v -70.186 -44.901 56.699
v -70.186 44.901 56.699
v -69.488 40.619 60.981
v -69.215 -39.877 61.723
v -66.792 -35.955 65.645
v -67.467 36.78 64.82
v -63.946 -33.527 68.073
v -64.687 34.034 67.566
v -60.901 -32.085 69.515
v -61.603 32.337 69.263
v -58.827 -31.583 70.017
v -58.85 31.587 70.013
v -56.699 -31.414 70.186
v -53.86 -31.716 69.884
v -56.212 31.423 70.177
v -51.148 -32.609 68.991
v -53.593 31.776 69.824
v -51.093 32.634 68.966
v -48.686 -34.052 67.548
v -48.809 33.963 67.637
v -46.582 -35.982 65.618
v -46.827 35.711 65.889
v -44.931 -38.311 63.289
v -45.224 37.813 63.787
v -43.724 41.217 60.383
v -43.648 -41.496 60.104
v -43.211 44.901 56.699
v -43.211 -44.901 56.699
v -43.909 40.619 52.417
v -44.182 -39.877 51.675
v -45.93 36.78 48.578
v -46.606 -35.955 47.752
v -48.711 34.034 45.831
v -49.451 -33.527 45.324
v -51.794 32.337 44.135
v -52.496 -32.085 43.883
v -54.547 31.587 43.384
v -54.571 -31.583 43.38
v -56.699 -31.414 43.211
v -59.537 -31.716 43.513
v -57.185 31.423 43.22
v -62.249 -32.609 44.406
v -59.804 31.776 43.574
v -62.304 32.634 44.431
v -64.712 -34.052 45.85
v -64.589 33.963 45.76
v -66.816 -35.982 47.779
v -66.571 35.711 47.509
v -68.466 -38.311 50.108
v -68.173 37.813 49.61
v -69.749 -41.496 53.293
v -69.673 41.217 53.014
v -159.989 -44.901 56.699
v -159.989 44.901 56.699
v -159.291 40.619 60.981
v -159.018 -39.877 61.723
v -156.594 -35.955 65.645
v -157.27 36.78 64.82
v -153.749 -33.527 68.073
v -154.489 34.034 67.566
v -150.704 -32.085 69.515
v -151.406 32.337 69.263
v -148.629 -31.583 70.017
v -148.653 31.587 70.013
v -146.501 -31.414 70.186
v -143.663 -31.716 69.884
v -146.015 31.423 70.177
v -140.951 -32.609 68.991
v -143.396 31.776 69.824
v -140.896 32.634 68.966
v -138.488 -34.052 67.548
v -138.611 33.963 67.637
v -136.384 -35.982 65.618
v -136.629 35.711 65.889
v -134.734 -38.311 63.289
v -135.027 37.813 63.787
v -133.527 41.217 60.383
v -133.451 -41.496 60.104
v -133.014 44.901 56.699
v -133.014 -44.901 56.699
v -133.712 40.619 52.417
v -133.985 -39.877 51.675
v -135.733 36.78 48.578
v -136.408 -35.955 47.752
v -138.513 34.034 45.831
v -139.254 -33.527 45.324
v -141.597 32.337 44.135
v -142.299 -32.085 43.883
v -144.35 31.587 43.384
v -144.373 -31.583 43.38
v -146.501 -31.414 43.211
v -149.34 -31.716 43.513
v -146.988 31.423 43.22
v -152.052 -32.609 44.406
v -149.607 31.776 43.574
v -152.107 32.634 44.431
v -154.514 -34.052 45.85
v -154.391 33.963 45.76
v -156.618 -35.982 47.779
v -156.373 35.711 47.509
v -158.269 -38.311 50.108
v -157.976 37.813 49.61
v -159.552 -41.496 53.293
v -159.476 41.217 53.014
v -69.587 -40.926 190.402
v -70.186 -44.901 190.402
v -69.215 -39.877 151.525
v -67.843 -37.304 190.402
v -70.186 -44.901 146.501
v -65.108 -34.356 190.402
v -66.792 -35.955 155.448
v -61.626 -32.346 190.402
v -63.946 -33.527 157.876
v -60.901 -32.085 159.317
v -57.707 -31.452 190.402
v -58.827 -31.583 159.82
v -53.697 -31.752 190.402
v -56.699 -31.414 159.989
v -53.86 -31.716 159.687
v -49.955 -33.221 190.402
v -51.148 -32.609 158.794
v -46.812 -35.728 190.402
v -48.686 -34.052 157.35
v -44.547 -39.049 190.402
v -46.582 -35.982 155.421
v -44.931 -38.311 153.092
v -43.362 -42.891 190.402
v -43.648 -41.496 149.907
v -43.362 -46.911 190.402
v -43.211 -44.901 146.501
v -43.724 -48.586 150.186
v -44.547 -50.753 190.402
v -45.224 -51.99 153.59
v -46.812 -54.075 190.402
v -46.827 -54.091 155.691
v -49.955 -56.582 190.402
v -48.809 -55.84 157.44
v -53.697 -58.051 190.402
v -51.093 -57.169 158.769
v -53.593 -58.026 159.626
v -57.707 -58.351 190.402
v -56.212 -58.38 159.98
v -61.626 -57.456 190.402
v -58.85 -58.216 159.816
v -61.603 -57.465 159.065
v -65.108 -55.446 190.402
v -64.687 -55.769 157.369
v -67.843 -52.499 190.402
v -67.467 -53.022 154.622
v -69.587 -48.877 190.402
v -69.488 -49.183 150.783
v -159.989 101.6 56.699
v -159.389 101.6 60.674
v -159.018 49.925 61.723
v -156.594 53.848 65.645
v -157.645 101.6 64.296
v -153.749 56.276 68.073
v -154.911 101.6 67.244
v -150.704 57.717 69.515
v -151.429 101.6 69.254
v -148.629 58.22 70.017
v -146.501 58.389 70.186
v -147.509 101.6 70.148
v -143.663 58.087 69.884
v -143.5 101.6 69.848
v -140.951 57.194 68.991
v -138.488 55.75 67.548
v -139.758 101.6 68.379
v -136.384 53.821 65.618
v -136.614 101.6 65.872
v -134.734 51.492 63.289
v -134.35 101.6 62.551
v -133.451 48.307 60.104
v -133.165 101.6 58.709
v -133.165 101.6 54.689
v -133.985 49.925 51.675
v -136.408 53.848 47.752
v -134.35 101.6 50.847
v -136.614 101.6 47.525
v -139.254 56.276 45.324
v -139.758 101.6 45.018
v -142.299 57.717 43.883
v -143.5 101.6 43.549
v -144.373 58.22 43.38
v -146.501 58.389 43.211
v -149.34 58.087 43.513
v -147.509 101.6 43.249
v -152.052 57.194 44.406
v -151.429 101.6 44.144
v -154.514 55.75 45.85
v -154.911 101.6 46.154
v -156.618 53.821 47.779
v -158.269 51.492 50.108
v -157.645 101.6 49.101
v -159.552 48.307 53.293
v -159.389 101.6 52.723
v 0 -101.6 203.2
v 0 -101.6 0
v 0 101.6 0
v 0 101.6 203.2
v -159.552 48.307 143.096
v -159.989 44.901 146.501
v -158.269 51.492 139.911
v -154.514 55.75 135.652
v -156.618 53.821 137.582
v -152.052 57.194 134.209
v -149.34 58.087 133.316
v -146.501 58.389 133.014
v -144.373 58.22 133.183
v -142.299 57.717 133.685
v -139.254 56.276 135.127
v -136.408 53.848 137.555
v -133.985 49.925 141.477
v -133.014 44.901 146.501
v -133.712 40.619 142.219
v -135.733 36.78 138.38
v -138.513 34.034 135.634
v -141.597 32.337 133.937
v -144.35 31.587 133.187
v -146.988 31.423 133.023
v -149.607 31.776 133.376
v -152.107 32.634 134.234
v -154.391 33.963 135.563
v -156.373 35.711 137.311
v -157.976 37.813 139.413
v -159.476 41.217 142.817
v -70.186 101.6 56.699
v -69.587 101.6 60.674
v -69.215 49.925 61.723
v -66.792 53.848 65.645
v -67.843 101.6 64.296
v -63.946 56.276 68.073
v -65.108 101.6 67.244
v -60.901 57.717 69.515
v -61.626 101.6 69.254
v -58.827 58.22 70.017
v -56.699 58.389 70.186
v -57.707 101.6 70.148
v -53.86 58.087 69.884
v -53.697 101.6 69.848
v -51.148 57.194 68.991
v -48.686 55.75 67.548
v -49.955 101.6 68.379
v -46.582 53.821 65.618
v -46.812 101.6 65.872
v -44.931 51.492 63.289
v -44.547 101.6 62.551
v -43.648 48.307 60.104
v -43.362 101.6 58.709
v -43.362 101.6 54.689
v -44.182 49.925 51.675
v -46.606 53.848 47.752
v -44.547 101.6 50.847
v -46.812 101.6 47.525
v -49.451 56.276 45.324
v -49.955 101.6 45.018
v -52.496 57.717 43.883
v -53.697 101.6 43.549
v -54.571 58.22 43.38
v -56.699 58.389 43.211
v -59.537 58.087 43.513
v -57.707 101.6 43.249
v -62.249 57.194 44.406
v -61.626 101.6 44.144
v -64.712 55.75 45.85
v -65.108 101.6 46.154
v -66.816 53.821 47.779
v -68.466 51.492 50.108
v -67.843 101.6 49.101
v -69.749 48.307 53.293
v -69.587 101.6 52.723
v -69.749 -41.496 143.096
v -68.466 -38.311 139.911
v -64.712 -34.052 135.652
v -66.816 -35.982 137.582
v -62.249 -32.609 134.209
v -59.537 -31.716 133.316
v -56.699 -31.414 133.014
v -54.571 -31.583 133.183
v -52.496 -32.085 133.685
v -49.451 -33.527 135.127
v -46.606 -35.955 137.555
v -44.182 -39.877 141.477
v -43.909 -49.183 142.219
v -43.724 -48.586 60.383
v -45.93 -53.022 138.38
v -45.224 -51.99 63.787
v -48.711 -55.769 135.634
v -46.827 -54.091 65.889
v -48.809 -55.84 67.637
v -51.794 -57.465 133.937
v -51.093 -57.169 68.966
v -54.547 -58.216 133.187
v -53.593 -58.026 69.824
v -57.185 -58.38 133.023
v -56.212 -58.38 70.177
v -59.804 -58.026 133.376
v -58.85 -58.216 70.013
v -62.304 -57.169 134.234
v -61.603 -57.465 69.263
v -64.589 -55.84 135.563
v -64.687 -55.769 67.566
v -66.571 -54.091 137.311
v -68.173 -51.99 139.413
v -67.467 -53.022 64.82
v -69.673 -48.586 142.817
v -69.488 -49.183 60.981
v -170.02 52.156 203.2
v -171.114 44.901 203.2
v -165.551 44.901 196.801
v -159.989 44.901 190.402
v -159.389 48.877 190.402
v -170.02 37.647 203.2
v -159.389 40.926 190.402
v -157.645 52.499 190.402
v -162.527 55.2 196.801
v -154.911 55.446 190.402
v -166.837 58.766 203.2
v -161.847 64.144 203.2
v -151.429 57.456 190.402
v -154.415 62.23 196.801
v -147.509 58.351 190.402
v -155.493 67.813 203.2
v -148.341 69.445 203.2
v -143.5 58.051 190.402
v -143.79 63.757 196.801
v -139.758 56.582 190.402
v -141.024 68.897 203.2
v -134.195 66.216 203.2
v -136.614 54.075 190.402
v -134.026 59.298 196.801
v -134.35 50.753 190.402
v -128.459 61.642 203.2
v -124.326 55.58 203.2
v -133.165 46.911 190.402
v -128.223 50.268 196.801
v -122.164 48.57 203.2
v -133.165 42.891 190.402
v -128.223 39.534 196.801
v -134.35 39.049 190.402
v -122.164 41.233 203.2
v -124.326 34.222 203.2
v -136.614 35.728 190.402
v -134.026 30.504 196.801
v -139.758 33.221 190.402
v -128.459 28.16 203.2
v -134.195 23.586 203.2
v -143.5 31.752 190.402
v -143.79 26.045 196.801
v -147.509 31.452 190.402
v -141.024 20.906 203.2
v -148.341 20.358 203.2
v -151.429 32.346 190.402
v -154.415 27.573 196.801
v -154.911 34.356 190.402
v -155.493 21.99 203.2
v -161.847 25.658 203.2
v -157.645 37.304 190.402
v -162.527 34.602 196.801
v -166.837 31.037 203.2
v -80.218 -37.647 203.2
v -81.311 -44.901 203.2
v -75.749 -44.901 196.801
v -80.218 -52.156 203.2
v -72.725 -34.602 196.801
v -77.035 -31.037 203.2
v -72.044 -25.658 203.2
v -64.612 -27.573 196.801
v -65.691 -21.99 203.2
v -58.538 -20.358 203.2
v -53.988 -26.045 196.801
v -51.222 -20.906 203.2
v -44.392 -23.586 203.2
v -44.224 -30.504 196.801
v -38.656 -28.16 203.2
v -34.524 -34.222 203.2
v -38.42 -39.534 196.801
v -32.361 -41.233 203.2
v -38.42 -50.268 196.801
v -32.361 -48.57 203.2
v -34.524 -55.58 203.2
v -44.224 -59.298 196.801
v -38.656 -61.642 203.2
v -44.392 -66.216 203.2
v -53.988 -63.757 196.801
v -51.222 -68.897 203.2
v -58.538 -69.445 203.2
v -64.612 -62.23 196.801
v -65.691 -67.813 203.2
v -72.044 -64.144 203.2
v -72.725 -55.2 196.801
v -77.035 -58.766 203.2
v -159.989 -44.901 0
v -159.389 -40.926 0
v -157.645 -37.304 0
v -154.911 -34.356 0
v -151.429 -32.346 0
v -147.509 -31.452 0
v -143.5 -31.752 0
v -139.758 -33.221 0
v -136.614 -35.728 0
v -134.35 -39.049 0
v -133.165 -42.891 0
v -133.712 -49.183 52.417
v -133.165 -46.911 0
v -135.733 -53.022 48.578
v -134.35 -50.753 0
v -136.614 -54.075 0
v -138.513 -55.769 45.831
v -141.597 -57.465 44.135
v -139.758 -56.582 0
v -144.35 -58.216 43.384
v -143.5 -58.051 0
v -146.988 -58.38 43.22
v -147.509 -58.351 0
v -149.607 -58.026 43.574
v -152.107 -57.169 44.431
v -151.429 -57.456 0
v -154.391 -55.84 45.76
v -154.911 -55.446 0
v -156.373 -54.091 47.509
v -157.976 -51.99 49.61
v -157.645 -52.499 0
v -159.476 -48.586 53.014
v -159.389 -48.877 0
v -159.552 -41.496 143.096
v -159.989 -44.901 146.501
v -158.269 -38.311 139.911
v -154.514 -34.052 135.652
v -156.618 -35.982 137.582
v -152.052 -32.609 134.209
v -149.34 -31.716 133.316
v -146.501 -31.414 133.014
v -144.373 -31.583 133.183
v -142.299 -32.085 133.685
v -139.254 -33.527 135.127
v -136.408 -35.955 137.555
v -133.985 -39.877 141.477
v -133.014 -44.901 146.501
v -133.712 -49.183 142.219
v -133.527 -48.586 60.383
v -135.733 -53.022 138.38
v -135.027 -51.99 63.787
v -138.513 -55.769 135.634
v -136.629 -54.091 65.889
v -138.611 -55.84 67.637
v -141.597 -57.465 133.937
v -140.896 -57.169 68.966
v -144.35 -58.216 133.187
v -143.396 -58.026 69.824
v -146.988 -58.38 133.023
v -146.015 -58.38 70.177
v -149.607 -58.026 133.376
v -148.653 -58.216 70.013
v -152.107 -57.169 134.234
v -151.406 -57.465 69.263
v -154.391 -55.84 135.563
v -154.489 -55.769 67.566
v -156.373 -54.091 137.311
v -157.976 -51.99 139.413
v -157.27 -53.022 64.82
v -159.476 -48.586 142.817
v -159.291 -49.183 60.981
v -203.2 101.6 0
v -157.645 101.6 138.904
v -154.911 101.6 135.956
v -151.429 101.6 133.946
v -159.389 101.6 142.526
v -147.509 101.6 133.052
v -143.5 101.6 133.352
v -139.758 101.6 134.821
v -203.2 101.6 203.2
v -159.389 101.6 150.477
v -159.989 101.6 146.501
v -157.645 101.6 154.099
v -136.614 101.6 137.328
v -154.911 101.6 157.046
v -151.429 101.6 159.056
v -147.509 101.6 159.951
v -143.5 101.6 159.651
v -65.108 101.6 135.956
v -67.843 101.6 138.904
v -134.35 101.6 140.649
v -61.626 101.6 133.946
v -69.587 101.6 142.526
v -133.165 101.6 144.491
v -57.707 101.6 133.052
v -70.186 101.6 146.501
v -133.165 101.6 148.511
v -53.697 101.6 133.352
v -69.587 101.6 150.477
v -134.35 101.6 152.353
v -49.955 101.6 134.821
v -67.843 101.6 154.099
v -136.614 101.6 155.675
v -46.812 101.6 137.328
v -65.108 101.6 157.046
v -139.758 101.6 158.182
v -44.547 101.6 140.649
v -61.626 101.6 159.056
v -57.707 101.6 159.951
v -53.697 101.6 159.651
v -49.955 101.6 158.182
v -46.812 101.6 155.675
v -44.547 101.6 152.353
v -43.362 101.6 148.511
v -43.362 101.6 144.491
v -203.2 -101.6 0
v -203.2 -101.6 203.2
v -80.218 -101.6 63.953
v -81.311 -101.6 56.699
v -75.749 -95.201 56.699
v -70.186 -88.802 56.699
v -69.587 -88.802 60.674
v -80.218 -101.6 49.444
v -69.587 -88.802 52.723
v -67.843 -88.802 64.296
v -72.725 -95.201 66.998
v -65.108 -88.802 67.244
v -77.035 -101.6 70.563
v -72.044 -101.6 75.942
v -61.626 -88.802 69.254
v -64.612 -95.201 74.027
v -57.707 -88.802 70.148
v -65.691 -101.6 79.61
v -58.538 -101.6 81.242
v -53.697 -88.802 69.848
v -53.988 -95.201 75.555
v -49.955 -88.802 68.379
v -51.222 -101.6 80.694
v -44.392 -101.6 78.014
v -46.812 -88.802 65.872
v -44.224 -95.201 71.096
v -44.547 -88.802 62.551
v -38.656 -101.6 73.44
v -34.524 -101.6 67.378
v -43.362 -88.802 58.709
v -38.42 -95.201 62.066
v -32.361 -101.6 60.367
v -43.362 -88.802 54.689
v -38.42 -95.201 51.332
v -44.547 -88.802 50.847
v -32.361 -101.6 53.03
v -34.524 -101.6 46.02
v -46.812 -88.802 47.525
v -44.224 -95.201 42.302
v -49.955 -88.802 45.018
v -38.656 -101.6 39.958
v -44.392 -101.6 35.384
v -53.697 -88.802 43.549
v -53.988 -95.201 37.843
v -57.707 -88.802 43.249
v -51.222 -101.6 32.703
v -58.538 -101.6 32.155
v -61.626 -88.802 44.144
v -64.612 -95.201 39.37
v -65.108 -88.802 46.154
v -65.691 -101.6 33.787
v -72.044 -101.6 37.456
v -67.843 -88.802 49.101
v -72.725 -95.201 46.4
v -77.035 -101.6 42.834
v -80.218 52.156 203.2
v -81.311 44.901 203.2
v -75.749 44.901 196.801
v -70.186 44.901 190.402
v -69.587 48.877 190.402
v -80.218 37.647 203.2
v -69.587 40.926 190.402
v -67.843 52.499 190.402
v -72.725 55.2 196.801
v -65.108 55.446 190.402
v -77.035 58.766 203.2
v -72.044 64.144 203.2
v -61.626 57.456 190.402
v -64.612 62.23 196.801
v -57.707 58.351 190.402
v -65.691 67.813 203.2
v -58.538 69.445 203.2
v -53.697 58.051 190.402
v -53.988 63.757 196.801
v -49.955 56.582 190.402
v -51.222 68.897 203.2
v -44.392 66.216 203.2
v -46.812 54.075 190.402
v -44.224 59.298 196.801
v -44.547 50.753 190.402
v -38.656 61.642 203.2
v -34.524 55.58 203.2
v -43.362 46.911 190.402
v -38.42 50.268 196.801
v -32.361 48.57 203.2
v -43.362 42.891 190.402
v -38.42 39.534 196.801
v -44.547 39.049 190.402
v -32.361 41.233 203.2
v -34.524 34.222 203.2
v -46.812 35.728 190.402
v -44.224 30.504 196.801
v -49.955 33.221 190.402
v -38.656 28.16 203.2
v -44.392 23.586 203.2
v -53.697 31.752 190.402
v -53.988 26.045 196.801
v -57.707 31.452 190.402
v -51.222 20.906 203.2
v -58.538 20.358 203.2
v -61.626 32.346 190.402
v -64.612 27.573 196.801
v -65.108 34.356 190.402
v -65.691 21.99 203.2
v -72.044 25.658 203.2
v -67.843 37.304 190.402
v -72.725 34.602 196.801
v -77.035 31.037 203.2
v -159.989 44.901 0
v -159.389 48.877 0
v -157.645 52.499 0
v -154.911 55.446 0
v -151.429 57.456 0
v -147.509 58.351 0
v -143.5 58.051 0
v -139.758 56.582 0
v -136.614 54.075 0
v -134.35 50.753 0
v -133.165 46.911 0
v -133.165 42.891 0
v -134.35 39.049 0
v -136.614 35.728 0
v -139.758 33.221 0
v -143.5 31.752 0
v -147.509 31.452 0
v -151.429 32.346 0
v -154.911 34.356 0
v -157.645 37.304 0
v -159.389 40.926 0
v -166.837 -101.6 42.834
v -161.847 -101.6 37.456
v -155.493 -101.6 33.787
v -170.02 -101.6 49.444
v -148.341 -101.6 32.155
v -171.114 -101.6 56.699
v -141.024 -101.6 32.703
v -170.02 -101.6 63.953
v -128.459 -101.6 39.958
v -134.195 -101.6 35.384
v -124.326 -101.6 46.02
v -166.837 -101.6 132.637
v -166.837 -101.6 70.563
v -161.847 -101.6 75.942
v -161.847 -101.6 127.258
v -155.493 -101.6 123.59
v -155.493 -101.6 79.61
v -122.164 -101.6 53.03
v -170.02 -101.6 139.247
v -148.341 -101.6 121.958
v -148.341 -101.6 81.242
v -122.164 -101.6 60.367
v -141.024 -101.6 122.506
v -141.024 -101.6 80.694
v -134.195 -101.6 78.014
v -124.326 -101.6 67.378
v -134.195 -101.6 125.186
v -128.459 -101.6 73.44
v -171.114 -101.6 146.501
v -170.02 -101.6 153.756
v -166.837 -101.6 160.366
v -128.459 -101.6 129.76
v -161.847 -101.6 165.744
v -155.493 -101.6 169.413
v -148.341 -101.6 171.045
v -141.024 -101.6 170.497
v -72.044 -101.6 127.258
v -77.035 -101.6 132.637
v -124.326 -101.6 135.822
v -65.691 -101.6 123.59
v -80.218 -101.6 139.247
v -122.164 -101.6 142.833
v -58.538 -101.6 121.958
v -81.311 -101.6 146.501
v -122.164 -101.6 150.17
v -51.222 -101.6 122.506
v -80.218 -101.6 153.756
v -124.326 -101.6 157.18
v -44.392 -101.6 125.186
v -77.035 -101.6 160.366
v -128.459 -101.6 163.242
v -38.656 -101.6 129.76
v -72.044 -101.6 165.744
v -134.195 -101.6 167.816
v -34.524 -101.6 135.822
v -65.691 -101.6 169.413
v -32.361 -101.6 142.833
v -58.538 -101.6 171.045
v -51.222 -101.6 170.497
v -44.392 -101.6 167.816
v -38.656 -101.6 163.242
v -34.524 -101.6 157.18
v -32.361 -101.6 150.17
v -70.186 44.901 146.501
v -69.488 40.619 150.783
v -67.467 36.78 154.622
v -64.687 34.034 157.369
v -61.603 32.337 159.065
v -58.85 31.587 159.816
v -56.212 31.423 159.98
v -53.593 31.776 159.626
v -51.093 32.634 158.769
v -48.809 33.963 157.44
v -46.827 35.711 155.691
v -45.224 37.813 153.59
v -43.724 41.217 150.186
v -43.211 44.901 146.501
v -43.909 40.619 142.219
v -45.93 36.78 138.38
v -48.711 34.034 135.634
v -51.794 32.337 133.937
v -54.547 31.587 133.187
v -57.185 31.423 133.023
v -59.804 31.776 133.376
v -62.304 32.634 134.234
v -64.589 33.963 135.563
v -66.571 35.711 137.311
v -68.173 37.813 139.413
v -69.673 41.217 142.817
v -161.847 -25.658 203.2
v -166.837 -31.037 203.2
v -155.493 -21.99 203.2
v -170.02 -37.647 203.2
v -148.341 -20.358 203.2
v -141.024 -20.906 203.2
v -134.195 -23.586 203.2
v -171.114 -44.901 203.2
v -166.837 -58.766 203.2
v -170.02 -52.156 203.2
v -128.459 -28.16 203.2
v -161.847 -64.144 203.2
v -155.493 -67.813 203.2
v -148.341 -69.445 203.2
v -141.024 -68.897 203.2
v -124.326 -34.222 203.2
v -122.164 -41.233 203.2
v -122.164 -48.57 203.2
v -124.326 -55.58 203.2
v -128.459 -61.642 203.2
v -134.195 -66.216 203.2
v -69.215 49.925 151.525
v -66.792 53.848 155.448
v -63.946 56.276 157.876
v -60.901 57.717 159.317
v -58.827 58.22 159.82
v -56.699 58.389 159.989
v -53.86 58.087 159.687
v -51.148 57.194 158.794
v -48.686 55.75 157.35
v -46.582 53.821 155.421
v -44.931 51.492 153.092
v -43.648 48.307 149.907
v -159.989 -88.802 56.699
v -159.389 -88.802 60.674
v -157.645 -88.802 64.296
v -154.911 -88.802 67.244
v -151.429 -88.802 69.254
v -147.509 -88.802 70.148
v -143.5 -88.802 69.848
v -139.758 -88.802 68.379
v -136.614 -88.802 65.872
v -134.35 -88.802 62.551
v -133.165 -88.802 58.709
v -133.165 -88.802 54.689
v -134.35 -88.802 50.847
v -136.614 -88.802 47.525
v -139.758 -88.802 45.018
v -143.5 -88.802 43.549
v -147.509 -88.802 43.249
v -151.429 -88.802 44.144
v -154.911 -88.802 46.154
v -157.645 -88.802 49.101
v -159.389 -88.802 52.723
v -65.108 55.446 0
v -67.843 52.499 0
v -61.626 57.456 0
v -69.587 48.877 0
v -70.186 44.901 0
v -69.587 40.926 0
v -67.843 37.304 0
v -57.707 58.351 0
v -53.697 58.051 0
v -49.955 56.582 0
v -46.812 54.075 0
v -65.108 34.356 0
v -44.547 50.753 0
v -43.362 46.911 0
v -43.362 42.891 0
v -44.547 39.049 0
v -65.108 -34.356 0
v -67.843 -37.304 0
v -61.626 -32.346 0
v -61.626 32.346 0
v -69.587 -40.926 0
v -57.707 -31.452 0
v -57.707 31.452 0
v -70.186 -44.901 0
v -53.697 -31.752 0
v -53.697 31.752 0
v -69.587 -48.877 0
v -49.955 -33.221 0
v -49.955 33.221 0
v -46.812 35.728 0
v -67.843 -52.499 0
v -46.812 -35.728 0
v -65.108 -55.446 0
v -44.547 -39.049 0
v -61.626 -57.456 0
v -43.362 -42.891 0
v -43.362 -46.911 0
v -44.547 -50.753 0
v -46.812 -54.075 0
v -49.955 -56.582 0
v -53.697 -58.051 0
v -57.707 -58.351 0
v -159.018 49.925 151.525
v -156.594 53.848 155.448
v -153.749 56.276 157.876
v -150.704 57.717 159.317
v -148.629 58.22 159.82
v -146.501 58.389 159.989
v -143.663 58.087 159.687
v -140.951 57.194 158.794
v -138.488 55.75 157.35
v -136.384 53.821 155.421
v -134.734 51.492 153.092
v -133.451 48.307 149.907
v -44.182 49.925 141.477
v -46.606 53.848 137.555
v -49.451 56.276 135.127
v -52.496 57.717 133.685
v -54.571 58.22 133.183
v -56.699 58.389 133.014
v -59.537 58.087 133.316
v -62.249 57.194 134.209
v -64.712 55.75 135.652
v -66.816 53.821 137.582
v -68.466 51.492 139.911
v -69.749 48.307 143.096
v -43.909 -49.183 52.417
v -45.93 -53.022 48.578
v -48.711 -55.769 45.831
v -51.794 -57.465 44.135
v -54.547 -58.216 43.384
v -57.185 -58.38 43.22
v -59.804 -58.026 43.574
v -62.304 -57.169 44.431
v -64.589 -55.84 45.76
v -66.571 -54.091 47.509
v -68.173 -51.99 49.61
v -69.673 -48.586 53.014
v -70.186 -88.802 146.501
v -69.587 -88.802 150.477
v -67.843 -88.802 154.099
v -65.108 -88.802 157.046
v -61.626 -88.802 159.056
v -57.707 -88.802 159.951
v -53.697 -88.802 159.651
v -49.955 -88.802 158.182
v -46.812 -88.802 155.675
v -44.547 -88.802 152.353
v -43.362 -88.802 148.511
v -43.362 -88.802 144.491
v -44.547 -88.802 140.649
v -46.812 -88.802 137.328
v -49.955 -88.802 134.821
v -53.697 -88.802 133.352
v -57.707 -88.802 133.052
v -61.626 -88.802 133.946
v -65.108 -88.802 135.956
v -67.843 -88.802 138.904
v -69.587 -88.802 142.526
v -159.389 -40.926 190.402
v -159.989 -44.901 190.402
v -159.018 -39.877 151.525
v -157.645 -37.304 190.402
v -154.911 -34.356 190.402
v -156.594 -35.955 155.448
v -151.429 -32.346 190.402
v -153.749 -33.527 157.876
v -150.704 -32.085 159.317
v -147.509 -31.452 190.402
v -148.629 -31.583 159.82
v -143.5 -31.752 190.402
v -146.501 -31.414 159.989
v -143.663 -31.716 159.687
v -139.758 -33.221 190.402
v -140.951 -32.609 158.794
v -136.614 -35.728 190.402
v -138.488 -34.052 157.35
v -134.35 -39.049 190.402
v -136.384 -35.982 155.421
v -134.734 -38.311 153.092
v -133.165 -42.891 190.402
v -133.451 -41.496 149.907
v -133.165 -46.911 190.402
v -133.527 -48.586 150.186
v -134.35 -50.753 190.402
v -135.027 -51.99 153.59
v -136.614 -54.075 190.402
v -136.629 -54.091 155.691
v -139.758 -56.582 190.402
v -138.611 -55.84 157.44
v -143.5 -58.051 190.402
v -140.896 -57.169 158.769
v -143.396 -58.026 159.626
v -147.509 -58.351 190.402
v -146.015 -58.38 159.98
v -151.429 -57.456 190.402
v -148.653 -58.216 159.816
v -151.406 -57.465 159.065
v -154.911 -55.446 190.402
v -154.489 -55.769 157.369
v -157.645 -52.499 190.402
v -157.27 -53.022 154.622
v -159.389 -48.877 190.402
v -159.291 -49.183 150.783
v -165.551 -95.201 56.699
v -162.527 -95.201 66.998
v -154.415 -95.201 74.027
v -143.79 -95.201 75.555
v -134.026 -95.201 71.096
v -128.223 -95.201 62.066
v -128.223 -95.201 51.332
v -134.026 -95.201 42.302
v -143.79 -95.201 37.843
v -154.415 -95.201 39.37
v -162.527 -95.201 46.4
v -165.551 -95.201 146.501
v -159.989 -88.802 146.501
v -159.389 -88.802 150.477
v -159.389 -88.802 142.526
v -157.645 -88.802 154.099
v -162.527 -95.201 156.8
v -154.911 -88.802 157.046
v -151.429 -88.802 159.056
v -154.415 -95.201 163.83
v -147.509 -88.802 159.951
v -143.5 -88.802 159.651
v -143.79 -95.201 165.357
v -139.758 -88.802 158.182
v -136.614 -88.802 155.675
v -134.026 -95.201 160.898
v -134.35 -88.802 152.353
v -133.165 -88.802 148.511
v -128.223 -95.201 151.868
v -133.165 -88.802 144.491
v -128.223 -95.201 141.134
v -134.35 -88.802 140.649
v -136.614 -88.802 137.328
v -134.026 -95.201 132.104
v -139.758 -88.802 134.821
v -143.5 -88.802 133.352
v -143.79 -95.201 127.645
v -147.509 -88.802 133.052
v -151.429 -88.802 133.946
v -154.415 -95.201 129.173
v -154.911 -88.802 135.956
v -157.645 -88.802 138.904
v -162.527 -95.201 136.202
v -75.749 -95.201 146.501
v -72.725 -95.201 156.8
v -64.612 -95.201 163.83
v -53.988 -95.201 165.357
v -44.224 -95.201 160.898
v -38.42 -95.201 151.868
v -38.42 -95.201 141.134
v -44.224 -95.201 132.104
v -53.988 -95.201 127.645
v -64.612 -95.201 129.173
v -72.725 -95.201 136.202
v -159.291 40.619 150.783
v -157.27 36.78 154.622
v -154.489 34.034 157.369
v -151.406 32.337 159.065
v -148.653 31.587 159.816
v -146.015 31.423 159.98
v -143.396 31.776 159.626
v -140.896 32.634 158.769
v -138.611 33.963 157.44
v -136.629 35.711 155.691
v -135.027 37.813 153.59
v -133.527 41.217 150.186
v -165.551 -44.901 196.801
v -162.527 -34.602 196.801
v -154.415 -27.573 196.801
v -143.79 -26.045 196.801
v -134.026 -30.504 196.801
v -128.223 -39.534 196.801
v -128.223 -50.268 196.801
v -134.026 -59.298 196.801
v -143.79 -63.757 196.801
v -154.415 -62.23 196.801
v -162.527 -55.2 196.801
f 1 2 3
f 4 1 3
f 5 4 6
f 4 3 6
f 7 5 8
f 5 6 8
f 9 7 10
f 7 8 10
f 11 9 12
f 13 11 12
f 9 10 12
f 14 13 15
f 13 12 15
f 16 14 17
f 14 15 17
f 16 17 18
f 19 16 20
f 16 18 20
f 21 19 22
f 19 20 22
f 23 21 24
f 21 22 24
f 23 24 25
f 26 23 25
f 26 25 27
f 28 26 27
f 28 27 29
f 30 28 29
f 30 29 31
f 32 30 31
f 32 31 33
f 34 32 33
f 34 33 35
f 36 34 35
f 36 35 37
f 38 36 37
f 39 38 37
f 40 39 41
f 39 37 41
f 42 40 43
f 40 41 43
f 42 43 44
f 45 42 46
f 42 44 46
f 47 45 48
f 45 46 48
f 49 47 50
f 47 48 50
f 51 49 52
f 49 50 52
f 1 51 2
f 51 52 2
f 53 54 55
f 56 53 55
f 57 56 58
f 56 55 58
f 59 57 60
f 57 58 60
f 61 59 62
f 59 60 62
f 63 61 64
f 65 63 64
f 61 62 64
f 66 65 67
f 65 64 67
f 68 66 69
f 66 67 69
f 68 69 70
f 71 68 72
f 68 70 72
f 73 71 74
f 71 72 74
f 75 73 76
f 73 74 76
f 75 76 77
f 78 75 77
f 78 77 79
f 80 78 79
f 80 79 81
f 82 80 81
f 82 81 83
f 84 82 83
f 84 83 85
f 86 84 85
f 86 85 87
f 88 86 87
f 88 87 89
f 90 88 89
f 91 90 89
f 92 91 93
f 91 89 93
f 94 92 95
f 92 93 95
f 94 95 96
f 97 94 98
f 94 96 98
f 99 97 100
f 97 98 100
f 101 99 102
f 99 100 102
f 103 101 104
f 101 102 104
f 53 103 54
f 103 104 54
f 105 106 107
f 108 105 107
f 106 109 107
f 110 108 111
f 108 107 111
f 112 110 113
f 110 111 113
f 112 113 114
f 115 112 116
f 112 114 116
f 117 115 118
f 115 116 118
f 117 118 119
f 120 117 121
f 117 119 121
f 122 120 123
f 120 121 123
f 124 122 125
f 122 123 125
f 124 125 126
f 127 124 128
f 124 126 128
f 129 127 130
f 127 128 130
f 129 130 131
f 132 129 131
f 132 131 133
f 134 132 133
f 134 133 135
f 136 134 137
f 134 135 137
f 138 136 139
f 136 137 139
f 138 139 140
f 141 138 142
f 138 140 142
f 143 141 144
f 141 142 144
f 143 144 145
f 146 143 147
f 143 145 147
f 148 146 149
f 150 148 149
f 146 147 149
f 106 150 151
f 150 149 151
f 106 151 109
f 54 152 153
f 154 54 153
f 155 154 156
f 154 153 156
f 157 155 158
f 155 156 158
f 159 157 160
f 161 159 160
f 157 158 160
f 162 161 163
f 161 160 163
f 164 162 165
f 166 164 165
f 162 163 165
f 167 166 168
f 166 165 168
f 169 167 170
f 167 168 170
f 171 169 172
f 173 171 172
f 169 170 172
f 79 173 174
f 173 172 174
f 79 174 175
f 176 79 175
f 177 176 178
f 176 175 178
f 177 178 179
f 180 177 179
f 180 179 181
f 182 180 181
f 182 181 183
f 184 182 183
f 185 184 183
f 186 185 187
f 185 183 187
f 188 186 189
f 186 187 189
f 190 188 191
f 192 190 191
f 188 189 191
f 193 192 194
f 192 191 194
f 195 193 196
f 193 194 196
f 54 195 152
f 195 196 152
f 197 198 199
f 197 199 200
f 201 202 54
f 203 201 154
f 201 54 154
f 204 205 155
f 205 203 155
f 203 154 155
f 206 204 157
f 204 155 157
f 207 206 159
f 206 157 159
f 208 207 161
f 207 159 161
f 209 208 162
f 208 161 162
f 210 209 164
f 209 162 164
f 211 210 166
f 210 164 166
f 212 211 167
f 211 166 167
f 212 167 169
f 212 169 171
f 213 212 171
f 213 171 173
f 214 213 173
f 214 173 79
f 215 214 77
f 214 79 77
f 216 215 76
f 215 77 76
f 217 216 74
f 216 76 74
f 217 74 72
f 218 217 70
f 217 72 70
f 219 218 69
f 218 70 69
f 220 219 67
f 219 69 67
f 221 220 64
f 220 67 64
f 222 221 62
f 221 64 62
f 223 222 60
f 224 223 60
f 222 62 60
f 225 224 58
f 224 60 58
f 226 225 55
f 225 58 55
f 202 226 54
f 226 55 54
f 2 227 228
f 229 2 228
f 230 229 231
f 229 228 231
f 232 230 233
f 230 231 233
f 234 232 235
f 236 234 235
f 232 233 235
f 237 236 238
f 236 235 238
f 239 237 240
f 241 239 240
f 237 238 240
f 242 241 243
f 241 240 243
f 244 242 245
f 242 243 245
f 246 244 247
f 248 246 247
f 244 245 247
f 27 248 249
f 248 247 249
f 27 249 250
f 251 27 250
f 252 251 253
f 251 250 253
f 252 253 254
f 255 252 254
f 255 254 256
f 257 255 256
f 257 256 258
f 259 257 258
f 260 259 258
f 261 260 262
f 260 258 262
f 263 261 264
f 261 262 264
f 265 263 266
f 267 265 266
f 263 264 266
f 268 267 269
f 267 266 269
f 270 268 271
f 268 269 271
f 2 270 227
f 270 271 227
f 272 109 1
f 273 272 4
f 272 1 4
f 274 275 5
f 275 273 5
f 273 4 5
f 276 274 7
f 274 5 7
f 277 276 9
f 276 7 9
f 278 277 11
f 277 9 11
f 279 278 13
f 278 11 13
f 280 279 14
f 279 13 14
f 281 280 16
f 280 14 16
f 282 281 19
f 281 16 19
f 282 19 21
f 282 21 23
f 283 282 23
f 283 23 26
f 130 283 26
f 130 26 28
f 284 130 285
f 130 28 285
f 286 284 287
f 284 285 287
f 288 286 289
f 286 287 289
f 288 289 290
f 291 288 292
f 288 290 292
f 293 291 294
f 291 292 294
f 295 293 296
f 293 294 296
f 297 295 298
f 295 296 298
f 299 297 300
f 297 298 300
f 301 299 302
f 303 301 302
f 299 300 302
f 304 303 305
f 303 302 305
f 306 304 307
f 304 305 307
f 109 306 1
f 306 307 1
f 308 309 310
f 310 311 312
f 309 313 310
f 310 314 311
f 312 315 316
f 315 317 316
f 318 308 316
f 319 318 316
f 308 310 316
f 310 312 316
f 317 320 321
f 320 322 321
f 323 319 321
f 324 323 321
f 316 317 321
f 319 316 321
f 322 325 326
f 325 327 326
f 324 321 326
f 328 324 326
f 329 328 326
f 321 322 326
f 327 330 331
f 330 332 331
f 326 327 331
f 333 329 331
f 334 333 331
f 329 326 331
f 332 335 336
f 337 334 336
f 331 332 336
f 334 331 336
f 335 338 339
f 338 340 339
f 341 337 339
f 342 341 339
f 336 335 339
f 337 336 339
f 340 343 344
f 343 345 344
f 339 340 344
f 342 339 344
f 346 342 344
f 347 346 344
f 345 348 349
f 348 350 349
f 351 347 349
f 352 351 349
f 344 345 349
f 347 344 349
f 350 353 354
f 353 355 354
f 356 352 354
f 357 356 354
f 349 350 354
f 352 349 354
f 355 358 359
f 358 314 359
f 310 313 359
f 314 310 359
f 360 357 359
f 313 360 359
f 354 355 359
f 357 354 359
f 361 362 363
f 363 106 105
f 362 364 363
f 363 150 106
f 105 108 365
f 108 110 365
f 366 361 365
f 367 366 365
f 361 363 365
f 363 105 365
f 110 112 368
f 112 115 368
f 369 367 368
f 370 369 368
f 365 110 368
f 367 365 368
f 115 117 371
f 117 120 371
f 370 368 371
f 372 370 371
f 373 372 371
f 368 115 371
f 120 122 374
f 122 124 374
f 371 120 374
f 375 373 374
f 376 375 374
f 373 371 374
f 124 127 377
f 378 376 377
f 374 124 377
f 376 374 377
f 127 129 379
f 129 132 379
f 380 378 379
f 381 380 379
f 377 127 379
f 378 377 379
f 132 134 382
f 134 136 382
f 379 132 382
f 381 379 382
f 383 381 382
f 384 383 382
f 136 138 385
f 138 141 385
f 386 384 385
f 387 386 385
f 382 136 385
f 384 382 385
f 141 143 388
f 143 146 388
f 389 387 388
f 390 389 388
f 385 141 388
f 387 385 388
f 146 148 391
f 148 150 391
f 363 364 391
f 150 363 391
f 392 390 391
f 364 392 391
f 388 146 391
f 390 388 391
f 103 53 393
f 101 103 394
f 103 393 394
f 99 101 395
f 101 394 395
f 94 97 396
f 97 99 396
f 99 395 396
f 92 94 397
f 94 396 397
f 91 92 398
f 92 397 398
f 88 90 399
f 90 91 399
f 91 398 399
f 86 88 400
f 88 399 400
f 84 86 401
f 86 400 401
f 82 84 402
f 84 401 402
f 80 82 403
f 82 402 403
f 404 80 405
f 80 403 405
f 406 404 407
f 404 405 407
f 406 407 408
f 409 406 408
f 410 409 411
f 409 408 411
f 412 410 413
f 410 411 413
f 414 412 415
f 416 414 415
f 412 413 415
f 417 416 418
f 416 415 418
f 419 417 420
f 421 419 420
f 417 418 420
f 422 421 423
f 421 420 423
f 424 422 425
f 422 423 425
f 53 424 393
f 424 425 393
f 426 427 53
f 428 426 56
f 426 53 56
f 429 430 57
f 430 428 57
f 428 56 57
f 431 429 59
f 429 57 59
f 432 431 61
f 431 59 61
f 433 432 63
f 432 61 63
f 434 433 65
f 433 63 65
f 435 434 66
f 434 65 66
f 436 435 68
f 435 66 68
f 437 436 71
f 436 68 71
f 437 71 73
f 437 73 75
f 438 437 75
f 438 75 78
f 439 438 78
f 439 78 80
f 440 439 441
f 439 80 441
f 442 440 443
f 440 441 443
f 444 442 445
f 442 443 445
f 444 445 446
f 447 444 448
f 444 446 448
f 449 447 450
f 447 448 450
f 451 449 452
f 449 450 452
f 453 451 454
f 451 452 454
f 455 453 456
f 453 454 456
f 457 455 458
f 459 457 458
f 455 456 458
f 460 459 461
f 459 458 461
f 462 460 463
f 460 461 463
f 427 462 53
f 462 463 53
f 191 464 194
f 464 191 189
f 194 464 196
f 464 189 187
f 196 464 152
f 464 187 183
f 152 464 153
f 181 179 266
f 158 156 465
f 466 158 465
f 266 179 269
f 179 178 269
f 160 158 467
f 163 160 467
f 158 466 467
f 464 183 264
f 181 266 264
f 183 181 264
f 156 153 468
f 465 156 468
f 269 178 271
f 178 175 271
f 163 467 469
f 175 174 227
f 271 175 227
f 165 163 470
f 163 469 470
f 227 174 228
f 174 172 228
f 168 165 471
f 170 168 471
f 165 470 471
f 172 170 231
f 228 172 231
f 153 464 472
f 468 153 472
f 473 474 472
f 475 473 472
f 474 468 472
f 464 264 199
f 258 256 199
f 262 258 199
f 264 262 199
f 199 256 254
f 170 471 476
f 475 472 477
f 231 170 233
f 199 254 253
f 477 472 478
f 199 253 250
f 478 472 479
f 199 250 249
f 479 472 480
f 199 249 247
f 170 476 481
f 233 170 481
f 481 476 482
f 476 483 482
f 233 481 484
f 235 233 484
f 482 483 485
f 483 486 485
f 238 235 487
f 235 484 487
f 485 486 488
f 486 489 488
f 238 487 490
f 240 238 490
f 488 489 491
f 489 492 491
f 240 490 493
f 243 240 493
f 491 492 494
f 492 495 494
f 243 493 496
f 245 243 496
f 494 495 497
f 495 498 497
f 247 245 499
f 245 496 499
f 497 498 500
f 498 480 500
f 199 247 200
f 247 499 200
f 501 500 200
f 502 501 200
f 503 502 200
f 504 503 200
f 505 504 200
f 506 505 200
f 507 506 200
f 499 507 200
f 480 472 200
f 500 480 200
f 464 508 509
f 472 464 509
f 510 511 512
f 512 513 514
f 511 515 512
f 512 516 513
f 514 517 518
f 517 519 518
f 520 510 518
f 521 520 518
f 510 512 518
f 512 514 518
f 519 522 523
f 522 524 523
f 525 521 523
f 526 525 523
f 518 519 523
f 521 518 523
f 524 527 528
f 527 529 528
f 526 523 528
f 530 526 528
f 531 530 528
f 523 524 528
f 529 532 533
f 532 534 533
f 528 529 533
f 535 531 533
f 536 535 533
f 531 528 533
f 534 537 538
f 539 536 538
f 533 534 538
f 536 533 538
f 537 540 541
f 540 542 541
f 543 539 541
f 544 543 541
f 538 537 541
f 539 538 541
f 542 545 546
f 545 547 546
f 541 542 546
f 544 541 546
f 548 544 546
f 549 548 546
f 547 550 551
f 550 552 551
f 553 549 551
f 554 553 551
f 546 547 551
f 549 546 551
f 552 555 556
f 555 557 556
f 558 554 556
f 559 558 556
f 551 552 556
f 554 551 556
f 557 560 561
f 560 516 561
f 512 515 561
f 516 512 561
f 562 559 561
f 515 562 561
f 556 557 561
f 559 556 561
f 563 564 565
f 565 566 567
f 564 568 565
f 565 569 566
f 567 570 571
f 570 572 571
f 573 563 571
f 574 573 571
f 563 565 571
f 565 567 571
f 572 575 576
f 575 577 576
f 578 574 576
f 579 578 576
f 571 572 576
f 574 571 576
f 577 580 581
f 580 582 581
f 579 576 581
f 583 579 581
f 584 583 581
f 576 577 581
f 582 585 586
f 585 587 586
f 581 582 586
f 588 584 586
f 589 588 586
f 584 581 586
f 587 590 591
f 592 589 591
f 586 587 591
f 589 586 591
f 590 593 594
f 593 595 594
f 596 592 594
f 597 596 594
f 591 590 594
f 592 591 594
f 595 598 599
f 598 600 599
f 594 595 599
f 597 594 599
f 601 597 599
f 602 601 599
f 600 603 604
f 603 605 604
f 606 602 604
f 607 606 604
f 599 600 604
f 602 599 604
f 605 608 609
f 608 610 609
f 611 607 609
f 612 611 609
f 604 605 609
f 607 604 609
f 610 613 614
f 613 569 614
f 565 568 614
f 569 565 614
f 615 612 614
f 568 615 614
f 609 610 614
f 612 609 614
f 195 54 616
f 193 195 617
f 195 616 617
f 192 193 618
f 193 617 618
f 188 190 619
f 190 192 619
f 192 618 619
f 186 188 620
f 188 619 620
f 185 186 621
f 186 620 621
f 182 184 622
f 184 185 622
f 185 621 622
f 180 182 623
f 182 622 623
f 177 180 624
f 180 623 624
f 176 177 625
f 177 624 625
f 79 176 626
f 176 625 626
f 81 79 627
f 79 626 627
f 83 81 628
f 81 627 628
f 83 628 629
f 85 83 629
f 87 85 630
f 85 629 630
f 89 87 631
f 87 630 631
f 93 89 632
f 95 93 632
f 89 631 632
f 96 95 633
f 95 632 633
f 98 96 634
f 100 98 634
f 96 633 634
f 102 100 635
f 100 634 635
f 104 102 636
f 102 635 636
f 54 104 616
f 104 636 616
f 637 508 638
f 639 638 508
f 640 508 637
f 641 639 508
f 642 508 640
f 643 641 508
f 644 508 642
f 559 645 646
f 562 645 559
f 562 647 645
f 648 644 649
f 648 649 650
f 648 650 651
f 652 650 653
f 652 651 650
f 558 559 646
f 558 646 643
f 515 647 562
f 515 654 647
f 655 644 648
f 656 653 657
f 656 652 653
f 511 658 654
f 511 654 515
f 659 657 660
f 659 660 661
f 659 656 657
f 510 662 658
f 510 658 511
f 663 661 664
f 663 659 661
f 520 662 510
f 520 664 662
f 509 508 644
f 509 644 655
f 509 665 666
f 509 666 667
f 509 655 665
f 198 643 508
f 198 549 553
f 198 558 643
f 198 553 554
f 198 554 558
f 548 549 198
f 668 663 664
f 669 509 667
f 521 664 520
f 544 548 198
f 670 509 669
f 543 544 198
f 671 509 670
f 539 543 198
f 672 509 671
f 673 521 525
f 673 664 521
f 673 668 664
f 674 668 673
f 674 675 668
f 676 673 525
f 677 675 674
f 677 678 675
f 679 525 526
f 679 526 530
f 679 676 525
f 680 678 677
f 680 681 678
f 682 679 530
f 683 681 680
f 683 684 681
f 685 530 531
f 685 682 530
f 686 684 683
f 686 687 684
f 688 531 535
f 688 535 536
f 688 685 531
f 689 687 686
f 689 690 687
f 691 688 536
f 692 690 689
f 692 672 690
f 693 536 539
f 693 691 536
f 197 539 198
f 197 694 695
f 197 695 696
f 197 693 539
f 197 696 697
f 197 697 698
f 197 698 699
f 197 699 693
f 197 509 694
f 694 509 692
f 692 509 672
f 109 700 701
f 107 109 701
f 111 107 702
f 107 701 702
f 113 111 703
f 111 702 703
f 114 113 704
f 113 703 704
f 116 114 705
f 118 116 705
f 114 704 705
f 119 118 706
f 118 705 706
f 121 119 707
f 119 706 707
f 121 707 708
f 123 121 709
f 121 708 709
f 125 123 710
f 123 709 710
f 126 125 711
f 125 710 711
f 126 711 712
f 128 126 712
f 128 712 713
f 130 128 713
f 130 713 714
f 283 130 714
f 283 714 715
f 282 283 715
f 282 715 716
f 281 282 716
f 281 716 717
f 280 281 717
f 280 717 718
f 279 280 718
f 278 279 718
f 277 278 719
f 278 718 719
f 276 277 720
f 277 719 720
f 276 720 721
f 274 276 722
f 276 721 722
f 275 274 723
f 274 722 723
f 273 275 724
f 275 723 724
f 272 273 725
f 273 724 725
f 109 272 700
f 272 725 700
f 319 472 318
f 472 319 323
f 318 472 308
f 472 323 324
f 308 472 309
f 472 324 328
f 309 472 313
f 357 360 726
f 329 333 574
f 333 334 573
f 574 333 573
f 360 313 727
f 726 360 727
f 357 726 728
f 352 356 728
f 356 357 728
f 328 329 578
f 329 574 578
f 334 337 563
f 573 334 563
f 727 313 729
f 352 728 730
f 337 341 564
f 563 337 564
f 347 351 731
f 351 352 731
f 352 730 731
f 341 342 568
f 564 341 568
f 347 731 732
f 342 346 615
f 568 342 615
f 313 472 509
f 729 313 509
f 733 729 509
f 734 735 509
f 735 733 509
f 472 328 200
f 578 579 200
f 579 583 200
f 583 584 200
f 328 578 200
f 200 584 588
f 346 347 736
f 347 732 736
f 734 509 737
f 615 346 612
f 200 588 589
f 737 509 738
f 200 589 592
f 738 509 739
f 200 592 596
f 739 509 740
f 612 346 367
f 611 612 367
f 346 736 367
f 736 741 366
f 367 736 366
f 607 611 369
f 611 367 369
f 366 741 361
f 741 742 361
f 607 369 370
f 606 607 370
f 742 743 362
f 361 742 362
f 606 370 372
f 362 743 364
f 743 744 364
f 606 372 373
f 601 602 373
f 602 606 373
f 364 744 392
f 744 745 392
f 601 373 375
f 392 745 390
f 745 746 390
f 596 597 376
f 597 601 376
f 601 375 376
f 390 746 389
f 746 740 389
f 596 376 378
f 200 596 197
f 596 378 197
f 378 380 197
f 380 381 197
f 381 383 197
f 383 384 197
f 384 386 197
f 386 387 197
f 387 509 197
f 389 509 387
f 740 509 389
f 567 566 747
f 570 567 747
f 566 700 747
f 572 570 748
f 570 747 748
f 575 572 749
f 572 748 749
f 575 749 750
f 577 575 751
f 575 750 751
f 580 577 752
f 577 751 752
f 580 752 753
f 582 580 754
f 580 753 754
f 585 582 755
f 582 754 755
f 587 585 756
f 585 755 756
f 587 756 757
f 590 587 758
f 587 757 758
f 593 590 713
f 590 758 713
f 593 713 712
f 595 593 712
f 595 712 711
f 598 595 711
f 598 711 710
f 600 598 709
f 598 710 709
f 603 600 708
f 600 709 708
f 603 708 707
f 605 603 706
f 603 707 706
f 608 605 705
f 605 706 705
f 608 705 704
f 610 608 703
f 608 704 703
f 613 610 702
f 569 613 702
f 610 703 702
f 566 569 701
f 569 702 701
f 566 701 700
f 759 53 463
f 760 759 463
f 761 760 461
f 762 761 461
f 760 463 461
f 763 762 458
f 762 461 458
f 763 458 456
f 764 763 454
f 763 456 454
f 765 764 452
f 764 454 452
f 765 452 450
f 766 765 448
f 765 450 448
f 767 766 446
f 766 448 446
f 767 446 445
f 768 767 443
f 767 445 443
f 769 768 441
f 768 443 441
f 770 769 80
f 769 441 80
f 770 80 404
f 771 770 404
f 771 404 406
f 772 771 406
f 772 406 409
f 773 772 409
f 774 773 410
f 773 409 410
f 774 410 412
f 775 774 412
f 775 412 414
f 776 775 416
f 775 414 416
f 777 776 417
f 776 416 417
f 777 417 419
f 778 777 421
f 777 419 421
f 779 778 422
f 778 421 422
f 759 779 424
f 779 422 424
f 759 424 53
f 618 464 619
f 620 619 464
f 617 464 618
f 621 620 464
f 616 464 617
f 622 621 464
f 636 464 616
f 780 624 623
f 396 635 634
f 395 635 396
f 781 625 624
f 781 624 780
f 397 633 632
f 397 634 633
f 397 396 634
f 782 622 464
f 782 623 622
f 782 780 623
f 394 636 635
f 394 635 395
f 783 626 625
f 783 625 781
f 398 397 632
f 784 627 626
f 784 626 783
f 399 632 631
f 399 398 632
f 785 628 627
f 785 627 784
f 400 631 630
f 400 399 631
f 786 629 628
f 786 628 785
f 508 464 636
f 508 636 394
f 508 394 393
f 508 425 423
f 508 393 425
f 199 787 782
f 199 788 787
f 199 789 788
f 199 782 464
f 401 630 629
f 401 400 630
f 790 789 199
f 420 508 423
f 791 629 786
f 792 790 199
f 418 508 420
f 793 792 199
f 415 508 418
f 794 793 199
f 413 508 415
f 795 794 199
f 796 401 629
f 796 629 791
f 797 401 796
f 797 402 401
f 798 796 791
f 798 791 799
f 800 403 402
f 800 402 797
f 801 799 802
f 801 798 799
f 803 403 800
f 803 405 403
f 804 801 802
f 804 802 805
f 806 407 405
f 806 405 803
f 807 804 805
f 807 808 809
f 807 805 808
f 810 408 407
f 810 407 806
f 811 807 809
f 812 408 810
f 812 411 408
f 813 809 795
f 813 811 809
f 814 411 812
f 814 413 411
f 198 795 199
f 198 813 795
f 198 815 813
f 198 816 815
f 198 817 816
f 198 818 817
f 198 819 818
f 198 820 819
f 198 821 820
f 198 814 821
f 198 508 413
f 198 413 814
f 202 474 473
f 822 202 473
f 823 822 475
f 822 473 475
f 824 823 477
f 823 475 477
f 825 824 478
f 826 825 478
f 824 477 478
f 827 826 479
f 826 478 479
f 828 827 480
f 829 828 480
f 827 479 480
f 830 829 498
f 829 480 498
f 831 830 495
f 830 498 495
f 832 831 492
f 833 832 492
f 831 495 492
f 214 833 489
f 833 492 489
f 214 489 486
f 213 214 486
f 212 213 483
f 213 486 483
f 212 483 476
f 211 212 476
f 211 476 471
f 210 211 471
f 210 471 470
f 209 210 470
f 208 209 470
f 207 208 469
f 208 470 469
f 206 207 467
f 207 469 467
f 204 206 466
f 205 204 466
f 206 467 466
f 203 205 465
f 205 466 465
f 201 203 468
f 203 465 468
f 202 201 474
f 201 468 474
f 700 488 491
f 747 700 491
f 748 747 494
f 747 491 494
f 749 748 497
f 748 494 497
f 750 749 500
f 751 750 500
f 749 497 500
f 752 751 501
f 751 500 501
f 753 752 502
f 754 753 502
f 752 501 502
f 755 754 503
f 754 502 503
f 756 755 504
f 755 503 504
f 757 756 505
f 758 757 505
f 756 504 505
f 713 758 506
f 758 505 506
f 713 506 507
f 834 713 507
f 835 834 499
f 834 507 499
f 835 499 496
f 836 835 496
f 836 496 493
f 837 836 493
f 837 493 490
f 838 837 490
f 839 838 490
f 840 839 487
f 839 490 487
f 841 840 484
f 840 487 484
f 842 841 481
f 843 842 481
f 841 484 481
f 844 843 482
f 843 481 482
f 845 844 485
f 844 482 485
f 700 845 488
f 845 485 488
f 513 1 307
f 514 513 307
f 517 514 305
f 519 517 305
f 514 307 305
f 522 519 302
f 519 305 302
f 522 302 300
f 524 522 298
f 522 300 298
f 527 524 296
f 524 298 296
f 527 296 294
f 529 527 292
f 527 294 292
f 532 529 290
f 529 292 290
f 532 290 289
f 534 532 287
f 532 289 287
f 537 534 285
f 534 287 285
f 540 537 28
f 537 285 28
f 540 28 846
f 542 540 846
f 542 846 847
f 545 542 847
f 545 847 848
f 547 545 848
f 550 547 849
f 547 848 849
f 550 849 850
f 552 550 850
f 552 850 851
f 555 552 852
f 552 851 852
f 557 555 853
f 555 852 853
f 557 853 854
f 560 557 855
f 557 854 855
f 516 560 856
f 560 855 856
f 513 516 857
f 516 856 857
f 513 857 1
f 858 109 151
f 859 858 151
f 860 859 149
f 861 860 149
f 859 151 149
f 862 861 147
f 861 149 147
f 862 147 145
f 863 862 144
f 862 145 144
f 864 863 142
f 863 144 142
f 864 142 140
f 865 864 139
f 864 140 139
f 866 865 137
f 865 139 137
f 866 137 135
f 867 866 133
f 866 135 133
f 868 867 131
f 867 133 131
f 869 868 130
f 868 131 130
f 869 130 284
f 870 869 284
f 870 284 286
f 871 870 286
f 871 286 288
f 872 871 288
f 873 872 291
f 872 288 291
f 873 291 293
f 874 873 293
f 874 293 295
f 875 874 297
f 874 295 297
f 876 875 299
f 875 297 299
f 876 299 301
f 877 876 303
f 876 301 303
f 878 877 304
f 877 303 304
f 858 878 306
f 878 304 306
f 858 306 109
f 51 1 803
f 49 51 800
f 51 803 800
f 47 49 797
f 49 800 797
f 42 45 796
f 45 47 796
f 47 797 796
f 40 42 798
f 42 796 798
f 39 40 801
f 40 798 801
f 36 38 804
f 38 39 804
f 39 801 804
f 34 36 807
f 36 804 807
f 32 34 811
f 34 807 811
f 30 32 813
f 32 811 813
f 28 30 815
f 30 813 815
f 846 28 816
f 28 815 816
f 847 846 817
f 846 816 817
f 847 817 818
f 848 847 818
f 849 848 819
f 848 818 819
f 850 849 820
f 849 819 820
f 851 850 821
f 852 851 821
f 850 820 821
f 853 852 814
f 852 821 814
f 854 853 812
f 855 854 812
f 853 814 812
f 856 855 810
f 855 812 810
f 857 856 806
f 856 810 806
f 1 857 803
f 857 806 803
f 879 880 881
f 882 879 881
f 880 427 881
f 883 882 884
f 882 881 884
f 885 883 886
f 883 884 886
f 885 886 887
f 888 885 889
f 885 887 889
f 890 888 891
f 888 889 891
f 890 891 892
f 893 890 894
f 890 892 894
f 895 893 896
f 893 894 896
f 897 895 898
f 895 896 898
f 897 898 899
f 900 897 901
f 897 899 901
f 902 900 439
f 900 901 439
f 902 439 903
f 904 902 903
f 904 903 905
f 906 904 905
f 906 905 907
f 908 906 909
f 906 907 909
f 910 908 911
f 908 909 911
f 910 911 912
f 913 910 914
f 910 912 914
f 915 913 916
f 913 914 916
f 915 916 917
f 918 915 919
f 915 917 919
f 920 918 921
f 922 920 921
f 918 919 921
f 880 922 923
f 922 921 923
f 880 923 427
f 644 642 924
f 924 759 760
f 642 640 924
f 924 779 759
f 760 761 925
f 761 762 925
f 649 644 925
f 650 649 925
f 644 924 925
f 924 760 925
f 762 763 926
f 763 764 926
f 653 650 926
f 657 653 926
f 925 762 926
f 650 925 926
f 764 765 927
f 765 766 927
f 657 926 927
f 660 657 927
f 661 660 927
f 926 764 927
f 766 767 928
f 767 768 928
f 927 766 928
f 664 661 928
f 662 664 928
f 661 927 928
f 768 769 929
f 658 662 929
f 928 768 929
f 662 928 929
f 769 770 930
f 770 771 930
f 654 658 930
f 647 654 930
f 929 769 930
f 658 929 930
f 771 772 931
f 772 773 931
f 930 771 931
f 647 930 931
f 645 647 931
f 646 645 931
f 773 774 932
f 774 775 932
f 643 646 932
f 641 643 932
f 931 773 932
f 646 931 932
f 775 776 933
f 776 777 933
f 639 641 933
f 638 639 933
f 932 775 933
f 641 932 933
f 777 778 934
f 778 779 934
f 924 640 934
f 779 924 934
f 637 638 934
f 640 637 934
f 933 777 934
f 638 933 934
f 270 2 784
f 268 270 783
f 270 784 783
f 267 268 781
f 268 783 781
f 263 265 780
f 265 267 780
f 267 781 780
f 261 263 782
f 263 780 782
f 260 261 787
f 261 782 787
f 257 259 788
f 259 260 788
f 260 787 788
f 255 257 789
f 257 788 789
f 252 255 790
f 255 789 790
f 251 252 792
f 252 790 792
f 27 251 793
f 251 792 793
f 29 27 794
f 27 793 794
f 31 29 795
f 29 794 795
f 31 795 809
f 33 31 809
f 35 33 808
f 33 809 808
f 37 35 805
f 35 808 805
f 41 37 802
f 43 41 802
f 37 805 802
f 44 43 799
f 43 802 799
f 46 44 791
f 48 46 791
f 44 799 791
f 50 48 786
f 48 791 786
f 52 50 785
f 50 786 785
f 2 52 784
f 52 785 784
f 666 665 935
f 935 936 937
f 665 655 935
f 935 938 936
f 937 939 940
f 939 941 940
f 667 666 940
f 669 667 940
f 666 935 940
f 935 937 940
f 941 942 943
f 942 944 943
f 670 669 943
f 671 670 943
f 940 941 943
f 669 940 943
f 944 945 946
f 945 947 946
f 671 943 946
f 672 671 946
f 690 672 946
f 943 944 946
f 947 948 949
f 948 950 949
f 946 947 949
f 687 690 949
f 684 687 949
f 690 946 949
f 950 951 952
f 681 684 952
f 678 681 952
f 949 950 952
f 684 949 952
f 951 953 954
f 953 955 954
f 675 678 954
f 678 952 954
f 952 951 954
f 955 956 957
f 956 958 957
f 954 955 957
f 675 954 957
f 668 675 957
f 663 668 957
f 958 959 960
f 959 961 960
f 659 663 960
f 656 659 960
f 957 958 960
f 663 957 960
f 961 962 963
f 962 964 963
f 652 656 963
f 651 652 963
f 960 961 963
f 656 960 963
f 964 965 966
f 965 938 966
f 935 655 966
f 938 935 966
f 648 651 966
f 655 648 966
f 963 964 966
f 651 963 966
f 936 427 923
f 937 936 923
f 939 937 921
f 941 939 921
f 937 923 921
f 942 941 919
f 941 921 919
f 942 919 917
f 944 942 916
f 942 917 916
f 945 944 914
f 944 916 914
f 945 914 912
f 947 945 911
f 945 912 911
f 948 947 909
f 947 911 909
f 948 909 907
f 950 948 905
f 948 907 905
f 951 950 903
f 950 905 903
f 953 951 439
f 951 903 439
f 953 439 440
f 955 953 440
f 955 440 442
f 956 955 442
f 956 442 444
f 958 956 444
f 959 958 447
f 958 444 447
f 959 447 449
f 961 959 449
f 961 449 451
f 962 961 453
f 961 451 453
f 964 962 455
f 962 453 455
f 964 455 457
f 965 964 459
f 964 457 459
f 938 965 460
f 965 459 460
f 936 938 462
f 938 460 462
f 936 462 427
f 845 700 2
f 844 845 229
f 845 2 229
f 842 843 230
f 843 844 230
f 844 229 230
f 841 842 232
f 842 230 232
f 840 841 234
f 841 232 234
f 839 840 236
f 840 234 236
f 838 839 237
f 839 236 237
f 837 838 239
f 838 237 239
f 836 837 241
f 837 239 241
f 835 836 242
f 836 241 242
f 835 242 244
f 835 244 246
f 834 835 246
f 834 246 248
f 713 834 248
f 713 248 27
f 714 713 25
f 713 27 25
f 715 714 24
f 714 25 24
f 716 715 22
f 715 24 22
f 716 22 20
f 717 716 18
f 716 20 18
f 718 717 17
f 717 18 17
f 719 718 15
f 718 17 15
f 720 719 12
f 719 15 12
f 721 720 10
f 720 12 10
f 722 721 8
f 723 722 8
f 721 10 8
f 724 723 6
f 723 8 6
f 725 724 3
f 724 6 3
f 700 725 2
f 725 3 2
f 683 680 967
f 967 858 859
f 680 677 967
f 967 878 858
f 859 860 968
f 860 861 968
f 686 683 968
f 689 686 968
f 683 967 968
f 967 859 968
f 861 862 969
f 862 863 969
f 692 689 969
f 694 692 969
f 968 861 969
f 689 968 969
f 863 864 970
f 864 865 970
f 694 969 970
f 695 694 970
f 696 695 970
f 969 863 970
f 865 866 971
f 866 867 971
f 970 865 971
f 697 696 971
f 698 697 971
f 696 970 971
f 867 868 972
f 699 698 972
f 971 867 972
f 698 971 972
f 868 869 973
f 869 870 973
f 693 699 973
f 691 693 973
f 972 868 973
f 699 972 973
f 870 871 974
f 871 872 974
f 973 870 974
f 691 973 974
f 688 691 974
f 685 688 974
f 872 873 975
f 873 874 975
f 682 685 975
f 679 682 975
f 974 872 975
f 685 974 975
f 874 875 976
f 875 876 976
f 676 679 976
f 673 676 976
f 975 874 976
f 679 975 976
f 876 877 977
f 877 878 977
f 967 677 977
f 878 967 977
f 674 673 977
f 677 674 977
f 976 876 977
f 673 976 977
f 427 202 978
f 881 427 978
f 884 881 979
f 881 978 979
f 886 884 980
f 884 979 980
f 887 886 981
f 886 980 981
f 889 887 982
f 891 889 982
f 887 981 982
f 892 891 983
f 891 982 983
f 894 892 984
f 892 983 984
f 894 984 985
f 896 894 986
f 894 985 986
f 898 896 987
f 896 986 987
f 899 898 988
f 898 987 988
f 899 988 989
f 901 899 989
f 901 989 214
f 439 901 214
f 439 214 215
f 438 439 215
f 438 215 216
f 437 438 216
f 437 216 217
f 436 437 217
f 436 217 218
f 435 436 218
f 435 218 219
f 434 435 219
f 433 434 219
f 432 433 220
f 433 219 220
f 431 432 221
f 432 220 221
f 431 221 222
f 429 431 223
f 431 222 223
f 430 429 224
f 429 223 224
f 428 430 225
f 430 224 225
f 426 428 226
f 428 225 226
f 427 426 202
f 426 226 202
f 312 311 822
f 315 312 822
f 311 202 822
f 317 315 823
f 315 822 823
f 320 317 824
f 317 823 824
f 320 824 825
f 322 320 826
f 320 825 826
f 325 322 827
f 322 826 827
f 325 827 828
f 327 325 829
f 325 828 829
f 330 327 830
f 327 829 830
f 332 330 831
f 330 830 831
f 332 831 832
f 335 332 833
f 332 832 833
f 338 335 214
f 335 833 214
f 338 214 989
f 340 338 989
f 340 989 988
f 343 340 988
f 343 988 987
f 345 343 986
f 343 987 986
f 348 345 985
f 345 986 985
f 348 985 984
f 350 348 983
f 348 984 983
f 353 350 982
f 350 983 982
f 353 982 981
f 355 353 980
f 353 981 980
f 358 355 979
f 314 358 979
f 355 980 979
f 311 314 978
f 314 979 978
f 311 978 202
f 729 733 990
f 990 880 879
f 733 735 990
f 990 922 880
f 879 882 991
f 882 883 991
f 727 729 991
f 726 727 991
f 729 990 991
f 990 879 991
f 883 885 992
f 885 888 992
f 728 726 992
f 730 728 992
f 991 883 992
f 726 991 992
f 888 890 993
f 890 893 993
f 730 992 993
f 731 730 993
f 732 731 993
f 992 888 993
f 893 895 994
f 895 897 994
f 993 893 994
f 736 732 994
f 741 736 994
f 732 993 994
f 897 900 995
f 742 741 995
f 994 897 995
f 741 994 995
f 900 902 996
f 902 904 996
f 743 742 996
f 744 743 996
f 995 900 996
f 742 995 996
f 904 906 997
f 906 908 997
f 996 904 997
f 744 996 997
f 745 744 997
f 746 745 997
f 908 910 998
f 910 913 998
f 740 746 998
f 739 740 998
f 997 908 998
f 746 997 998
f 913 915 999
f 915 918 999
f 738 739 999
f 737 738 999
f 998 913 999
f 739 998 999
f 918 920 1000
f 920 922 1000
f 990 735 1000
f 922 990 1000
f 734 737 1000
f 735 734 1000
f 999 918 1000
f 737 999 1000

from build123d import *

# Parameters (mm, degrees)
F0_W           = 203.2
F0_H           = 203.2
F1_DEPTH       = 101.6
F3_D           = 26.9748
F3_CSINK_D     = 49.2252
F3_CSINK_ANGLE = 82
F5_D           = 26.9748
F5_CSINK_D     = 49.2252
F5_CSINK_ANGLE = 82


with BuildPart() as f1:
    # F0 (on Front) → F1 (new body, symmetric)
    with BuildSketch(Plane.XZ):
        with Locations((-101.6, 101.6)):
            Rectangle(F0_W, F0_H)
    extrude(amount=F1_DEPTH, both=True)

    # F3 (through all)
    with Locations(Plane.XZ.offset(101.6)):
        with Locations((-56.698719, 146.501281), (-146.501281, 146.501281), (-146.501281, 56.698719), (-56.698719, 56.698719)):
            CounterSinkHole(F3_D / 2, F3_CSINK_D / 2, counter_sink_angle=F3_CSINK_ANGLE)

    # F5 (through all)
    with Locations(Plane.XY.offset(203.2)):
        with Locations((-56.698719, 44.901281), (-146.501281, 44.901281), (-146.501281, -44.901281), (-56.698719, -44.901281)):
            CounterSinkHole(F5_D / 2, F5_CSINK_D / 2, counter_sink_angle=F5_CSINK_ANGLE)


solid = f1.part
